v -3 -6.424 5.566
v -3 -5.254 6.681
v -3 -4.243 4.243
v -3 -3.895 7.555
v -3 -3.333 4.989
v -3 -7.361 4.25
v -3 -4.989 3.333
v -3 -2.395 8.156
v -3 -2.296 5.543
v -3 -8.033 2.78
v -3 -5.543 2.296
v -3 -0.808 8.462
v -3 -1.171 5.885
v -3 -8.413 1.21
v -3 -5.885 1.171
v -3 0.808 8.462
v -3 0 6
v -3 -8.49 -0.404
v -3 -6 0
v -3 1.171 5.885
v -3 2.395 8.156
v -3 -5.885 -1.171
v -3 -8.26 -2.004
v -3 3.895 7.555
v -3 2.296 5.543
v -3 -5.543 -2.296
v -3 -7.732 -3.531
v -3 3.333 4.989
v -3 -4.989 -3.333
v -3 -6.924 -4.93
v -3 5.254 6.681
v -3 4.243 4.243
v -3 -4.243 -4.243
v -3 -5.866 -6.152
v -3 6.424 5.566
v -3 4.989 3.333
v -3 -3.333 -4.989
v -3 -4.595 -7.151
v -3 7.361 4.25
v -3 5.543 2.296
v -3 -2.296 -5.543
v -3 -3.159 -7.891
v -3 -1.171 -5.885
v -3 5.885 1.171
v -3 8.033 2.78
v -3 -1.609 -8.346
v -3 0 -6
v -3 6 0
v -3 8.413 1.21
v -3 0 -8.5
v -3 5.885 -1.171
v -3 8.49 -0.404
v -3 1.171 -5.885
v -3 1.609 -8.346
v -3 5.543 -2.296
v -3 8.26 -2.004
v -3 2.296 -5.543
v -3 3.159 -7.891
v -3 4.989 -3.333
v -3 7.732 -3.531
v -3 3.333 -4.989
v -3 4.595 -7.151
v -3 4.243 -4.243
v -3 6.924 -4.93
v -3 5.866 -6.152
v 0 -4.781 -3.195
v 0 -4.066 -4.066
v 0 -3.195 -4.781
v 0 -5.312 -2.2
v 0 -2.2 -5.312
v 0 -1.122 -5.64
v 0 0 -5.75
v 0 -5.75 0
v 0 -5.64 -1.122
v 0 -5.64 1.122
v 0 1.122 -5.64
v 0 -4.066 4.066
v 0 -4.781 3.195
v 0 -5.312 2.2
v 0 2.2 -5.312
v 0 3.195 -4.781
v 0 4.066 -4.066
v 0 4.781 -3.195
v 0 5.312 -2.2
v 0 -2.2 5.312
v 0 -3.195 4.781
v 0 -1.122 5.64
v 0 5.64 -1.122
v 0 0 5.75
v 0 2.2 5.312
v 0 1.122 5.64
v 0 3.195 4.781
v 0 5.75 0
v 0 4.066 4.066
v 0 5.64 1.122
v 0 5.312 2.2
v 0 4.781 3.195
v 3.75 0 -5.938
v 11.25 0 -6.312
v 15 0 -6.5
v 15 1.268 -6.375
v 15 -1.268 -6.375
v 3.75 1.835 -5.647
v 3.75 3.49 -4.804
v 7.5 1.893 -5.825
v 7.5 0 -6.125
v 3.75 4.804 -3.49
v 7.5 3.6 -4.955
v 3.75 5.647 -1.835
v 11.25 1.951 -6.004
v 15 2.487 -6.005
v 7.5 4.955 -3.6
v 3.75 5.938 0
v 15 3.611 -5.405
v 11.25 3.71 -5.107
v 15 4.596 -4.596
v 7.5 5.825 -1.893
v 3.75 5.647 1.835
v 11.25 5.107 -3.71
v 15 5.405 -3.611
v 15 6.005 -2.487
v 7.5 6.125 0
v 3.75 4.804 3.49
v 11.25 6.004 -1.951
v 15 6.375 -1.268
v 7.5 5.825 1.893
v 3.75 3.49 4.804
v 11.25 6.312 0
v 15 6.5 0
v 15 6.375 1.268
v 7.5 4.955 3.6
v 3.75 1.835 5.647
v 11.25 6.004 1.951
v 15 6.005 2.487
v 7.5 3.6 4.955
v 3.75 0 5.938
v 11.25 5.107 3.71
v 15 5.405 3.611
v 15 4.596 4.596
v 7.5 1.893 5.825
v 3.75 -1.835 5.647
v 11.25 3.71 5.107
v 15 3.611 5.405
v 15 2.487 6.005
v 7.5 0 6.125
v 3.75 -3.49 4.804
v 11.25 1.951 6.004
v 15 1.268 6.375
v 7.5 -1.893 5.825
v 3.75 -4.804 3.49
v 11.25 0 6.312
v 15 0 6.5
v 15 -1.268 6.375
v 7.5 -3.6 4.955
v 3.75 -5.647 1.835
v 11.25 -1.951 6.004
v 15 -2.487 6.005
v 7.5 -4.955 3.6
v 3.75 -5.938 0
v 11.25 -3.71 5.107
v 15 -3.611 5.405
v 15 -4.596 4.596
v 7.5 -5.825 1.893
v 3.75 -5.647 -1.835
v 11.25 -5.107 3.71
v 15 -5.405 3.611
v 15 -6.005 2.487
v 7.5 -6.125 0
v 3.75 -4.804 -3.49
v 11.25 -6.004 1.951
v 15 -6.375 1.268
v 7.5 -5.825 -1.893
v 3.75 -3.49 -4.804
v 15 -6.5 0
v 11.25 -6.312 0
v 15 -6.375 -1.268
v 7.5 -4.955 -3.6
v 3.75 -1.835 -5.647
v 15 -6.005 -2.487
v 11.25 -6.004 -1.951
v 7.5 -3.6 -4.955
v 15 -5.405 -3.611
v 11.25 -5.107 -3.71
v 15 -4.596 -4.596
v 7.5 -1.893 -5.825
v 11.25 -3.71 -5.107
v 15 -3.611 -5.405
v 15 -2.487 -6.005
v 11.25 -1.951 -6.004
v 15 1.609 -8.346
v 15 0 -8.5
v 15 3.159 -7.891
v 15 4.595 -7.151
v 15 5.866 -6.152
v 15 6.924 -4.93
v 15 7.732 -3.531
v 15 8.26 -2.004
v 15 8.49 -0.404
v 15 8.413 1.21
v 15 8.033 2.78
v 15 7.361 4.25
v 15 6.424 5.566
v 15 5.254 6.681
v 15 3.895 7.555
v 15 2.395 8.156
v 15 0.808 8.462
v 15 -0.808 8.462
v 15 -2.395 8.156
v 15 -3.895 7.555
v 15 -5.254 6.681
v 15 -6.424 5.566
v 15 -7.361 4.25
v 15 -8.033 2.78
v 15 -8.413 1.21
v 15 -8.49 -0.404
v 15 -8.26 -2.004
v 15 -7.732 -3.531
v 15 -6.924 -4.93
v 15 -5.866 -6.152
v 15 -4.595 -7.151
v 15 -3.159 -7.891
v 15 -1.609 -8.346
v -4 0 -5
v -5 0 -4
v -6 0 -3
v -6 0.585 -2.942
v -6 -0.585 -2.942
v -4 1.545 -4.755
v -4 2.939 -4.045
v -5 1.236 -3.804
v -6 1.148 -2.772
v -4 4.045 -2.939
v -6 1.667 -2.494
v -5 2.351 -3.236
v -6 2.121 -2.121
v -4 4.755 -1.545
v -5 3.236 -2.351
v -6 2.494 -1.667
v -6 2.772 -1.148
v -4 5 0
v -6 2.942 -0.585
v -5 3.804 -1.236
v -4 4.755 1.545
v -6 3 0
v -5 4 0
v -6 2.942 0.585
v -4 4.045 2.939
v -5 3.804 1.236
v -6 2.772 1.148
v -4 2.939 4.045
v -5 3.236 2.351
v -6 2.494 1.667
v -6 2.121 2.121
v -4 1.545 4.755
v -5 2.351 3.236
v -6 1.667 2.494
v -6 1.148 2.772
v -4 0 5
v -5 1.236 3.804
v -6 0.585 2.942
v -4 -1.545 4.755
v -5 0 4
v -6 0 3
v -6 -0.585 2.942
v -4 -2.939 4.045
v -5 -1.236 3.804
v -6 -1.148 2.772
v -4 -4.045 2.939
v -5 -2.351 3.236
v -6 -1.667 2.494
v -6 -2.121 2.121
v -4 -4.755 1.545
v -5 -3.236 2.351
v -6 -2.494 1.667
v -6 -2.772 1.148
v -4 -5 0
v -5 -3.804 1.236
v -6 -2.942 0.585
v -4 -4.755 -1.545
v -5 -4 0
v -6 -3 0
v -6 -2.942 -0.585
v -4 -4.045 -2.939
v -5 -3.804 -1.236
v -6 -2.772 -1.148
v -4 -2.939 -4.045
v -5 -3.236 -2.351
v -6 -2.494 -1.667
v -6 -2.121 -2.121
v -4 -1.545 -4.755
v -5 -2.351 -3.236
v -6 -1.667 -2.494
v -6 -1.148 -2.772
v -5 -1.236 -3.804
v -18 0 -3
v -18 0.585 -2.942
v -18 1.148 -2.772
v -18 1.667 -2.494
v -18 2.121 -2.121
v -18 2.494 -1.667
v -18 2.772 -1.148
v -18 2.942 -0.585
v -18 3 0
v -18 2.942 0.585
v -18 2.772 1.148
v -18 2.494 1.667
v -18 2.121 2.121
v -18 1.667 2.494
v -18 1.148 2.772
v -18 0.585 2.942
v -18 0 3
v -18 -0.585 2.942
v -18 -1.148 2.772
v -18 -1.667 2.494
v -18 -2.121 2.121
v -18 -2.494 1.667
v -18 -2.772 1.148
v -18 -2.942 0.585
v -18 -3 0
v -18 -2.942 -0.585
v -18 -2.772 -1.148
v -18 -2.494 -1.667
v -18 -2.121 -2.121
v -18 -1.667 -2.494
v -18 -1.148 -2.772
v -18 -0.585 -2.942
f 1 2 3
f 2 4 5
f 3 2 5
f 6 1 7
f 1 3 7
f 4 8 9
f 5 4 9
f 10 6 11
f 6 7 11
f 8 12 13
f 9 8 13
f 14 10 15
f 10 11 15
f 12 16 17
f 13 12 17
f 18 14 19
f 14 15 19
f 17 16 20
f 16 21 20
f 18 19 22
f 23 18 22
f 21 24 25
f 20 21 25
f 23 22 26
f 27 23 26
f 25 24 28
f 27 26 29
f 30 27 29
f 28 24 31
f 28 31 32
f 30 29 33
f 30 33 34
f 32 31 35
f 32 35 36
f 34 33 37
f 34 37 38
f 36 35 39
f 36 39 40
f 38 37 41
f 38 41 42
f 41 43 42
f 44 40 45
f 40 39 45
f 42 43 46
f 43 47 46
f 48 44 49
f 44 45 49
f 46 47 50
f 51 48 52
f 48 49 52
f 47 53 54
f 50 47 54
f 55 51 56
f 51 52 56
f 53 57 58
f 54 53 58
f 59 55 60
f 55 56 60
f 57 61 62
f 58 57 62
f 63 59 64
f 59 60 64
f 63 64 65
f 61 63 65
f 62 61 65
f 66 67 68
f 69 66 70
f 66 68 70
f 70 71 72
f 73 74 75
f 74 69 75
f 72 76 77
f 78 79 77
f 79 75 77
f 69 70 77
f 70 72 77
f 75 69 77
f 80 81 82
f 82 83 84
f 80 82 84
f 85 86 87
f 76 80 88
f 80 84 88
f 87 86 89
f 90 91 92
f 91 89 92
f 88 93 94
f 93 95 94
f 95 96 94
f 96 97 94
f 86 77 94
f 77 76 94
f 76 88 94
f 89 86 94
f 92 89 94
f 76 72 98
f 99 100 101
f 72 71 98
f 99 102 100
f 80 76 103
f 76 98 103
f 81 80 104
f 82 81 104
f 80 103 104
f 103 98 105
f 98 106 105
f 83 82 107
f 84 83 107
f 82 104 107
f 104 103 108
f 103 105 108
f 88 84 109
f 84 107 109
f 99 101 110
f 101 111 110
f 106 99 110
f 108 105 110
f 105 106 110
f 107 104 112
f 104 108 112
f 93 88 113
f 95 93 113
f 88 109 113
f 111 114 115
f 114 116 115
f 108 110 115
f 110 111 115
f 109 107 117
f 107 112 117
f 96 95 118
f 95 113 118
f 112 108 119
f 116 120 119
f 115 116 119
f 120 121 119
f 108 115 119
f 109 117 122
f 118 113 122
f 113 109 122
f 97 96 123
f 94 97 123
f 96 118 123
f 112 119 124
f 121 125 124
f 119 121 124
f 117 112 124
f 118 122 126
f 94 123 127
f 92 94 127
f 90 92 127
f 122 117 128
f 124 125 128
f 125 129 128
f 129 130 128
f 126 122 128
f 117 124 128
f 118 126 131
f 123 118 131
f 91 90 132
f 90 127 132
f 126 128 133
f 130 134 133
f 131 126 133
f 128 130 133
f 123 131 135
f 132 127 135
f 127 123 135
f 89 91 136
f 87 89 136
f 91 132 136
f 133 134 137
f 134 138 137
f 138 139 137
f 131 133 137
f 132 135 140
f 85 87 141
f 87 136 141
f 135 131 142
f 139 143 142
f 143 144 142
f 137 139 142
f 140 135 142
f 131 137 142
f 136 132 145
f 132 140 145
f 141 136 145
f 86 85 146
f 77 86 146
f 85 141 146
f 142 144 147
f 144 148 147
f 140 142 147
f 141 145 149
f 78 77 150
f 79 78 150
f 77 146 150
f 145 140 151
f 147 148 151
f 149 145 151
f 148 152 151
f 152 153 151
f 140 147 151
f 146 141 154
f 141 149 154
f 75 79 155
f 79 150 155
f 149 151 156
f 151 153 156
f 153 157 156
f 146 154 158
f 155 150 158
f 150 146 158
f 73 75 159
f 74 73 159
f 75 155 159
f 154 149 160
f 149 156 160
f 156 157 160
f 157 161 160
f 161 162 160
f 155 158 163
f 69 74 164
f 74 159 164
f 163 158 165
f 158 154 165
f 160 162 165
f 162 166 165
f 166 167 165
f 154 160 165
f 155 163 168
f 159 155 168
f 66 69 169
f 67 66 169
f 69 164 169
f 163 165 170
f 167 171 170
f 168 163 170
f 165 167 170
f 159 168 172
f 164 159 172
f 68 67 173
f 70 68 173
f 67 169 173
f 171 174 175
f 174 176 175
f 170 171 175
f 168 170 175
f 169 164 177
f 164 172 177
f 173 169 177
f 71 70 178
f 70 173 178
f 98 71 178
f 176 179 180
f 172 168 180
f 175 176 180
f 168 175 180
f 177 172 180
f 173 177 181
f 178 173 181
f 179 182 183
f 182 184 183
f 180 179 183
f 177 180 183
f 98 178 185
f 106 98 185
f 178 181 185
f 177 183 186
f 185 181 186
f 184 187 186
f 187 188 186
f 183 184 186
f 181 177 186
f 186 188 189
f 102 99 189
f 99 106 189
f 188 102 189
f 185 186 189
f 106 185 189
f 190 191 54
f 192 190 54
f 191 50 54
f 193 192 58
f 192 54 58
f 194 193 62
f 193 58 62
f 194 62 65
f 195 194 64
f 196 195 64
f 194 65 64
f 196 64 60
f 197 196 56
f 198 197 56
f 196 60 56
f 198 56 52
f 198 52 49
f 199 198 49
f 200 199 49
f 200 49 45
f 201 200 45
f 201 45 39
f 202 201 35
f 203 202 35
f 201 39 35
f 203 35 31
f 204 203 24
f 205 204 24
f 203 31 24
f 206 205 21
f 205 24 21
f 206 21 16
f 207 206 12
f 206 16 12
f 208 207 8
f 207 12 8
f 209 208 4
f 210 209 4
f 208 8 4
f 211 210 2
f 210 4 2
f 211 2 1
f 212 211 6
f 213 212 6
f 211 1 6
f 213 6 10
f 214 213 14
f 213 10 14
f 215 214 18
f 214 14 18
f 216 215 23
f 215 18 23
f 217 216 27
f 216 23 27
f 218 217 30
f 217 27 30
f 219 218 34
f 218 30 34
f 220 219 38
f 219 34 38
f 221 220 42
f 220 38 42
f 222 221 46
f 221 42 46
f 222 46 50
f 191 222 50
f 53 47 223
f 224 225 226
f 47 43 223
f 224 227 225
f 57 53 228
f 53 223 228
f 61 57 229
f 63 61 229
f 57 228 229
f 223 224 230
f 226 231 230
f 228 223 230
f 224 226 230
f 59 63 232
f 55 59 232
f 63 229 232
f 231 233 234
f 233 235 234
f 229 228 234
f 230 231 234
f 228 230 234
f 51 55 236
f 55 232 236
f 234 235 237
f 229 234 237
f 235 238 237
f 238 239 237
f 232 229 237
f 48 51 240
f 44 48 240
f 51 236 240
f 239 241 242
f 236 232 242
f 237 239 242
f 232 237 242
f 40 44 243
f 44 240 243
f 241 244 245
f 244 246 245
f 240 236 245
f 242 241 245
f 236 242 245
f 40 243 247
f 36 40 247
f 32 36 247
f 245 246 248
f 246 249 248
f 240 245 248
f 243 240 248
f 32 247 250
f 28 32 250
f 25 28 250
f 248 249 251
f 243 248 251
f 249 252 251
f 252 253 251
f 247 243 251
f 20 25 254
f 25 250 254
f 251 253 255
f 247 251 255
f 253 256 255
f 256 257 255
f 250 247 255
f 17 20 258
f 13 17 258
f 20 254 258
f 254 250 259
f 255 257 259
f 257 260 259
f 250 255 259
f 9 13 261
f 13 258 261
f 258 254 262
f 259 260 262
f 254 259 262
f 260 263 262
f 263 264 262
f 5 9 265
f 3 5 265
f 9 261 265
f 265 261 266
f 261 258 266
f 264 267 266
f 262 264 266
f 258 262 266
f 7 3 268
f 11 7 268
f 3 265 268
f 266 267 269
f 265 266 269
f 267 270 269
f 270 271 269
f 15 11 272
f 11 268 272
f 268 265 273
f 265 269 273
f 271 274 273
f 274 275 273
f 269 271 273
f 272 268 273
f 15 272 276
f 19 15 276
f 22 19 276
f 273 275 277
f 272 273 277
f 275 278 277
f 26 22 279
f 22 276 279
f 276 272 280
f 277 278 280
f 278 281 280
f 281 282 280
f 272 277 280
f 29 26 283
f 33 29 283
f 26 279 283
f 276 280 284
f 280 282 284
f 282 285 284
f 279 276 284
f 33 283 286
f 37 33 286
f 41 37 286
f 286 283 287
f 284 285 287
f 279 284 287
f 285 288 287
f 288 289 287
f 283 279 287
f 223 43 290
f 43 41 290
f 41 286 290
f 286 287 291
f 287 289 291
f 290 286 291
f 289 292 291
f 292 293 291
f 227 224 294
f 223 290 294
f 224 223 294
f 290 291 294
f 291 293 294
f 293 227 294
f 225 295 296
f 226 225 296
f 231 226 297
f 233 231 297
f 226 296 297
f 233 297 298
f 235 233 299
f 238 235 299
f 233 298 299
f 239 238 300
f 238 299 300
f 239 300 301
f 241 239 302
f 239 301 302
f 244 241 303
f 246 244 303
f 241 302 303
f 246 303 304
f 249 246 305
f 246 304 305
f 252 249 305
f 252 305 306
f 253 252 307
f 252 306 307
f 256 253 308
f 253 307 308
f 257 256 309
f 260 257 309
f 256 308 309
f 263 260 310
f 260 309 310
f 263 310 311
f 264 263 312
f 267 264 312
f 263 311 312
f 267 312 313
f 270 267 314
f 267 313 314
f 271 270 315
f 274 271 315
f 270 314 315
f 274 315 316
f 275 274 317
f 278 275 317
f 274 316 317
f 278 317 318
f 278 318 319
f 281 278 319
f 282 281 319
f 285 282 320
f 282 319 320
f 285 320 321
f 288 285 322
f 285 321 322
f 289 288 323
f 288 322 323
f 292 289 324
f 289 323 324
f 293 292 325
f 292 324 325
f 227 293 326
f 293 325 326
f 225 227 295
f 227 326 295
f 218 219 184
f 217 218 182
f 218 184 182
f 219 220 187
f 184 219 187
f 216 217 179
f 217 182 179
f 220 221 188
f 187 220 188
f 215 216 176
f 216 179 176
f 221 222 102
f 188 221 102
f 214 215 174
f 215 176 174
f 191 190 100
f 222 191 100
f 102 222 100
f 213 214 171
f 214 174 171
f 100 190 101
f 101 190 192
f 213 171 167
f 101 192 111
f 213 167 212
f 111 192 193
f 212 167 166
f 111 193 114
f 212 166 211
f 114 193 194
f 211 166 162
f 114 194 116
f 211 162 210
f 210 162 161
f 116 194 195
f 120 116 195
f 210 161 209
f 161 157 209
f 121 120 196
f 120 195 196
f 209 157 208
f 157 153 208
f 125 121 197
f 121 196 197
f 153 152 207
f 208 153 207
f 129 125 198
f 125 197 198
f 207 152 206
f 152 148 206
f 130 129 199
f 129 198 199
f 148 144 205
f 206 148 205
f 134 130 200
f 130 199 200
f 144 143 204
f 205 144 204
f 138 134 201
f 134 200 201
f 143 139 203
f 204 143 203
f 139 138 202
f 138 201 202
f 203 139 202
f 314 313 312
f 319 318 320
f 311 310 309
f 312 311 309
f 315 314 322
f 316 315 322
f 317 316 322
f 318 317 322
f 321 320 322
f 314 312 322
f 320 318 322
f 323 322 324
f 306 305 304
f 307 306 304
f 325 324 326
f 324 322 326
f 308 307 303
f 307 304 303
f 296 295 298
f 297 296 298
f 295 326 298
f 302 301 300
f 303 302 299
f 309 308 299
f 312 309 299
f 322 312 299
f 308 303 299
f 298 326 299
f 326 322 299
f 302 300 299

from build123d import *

# Parameters (mm, degrees)
CHAMFER_1_SIZE = 3


with BuildPart() as part:
    # 草图1 → 旋转1 (revolve)
    with BuildSketch(Plane(origin=(0, 0, 0), x_dir=(1, 0, 0), z_dir=(0, 1, 0))):
        Polygon((15, 8.5), (-3, 8.5), (-3, 3), (-18, 3), (-18, 0), (0, 0), (0, 5.75), (15, 6.5), align=None)
    revolve(axis=Axis((-18, 0, 0), (1, 0, 0)))

    # 倒角1
    chamfer_1_edges = [part.edges().sort_by_distance(p)[0] for p in [
        (-3, 0, 3),
    ]]
    chamfer(chamfer_1_edges, length=CHAMFER_1_SIZE)


solid = part.part
